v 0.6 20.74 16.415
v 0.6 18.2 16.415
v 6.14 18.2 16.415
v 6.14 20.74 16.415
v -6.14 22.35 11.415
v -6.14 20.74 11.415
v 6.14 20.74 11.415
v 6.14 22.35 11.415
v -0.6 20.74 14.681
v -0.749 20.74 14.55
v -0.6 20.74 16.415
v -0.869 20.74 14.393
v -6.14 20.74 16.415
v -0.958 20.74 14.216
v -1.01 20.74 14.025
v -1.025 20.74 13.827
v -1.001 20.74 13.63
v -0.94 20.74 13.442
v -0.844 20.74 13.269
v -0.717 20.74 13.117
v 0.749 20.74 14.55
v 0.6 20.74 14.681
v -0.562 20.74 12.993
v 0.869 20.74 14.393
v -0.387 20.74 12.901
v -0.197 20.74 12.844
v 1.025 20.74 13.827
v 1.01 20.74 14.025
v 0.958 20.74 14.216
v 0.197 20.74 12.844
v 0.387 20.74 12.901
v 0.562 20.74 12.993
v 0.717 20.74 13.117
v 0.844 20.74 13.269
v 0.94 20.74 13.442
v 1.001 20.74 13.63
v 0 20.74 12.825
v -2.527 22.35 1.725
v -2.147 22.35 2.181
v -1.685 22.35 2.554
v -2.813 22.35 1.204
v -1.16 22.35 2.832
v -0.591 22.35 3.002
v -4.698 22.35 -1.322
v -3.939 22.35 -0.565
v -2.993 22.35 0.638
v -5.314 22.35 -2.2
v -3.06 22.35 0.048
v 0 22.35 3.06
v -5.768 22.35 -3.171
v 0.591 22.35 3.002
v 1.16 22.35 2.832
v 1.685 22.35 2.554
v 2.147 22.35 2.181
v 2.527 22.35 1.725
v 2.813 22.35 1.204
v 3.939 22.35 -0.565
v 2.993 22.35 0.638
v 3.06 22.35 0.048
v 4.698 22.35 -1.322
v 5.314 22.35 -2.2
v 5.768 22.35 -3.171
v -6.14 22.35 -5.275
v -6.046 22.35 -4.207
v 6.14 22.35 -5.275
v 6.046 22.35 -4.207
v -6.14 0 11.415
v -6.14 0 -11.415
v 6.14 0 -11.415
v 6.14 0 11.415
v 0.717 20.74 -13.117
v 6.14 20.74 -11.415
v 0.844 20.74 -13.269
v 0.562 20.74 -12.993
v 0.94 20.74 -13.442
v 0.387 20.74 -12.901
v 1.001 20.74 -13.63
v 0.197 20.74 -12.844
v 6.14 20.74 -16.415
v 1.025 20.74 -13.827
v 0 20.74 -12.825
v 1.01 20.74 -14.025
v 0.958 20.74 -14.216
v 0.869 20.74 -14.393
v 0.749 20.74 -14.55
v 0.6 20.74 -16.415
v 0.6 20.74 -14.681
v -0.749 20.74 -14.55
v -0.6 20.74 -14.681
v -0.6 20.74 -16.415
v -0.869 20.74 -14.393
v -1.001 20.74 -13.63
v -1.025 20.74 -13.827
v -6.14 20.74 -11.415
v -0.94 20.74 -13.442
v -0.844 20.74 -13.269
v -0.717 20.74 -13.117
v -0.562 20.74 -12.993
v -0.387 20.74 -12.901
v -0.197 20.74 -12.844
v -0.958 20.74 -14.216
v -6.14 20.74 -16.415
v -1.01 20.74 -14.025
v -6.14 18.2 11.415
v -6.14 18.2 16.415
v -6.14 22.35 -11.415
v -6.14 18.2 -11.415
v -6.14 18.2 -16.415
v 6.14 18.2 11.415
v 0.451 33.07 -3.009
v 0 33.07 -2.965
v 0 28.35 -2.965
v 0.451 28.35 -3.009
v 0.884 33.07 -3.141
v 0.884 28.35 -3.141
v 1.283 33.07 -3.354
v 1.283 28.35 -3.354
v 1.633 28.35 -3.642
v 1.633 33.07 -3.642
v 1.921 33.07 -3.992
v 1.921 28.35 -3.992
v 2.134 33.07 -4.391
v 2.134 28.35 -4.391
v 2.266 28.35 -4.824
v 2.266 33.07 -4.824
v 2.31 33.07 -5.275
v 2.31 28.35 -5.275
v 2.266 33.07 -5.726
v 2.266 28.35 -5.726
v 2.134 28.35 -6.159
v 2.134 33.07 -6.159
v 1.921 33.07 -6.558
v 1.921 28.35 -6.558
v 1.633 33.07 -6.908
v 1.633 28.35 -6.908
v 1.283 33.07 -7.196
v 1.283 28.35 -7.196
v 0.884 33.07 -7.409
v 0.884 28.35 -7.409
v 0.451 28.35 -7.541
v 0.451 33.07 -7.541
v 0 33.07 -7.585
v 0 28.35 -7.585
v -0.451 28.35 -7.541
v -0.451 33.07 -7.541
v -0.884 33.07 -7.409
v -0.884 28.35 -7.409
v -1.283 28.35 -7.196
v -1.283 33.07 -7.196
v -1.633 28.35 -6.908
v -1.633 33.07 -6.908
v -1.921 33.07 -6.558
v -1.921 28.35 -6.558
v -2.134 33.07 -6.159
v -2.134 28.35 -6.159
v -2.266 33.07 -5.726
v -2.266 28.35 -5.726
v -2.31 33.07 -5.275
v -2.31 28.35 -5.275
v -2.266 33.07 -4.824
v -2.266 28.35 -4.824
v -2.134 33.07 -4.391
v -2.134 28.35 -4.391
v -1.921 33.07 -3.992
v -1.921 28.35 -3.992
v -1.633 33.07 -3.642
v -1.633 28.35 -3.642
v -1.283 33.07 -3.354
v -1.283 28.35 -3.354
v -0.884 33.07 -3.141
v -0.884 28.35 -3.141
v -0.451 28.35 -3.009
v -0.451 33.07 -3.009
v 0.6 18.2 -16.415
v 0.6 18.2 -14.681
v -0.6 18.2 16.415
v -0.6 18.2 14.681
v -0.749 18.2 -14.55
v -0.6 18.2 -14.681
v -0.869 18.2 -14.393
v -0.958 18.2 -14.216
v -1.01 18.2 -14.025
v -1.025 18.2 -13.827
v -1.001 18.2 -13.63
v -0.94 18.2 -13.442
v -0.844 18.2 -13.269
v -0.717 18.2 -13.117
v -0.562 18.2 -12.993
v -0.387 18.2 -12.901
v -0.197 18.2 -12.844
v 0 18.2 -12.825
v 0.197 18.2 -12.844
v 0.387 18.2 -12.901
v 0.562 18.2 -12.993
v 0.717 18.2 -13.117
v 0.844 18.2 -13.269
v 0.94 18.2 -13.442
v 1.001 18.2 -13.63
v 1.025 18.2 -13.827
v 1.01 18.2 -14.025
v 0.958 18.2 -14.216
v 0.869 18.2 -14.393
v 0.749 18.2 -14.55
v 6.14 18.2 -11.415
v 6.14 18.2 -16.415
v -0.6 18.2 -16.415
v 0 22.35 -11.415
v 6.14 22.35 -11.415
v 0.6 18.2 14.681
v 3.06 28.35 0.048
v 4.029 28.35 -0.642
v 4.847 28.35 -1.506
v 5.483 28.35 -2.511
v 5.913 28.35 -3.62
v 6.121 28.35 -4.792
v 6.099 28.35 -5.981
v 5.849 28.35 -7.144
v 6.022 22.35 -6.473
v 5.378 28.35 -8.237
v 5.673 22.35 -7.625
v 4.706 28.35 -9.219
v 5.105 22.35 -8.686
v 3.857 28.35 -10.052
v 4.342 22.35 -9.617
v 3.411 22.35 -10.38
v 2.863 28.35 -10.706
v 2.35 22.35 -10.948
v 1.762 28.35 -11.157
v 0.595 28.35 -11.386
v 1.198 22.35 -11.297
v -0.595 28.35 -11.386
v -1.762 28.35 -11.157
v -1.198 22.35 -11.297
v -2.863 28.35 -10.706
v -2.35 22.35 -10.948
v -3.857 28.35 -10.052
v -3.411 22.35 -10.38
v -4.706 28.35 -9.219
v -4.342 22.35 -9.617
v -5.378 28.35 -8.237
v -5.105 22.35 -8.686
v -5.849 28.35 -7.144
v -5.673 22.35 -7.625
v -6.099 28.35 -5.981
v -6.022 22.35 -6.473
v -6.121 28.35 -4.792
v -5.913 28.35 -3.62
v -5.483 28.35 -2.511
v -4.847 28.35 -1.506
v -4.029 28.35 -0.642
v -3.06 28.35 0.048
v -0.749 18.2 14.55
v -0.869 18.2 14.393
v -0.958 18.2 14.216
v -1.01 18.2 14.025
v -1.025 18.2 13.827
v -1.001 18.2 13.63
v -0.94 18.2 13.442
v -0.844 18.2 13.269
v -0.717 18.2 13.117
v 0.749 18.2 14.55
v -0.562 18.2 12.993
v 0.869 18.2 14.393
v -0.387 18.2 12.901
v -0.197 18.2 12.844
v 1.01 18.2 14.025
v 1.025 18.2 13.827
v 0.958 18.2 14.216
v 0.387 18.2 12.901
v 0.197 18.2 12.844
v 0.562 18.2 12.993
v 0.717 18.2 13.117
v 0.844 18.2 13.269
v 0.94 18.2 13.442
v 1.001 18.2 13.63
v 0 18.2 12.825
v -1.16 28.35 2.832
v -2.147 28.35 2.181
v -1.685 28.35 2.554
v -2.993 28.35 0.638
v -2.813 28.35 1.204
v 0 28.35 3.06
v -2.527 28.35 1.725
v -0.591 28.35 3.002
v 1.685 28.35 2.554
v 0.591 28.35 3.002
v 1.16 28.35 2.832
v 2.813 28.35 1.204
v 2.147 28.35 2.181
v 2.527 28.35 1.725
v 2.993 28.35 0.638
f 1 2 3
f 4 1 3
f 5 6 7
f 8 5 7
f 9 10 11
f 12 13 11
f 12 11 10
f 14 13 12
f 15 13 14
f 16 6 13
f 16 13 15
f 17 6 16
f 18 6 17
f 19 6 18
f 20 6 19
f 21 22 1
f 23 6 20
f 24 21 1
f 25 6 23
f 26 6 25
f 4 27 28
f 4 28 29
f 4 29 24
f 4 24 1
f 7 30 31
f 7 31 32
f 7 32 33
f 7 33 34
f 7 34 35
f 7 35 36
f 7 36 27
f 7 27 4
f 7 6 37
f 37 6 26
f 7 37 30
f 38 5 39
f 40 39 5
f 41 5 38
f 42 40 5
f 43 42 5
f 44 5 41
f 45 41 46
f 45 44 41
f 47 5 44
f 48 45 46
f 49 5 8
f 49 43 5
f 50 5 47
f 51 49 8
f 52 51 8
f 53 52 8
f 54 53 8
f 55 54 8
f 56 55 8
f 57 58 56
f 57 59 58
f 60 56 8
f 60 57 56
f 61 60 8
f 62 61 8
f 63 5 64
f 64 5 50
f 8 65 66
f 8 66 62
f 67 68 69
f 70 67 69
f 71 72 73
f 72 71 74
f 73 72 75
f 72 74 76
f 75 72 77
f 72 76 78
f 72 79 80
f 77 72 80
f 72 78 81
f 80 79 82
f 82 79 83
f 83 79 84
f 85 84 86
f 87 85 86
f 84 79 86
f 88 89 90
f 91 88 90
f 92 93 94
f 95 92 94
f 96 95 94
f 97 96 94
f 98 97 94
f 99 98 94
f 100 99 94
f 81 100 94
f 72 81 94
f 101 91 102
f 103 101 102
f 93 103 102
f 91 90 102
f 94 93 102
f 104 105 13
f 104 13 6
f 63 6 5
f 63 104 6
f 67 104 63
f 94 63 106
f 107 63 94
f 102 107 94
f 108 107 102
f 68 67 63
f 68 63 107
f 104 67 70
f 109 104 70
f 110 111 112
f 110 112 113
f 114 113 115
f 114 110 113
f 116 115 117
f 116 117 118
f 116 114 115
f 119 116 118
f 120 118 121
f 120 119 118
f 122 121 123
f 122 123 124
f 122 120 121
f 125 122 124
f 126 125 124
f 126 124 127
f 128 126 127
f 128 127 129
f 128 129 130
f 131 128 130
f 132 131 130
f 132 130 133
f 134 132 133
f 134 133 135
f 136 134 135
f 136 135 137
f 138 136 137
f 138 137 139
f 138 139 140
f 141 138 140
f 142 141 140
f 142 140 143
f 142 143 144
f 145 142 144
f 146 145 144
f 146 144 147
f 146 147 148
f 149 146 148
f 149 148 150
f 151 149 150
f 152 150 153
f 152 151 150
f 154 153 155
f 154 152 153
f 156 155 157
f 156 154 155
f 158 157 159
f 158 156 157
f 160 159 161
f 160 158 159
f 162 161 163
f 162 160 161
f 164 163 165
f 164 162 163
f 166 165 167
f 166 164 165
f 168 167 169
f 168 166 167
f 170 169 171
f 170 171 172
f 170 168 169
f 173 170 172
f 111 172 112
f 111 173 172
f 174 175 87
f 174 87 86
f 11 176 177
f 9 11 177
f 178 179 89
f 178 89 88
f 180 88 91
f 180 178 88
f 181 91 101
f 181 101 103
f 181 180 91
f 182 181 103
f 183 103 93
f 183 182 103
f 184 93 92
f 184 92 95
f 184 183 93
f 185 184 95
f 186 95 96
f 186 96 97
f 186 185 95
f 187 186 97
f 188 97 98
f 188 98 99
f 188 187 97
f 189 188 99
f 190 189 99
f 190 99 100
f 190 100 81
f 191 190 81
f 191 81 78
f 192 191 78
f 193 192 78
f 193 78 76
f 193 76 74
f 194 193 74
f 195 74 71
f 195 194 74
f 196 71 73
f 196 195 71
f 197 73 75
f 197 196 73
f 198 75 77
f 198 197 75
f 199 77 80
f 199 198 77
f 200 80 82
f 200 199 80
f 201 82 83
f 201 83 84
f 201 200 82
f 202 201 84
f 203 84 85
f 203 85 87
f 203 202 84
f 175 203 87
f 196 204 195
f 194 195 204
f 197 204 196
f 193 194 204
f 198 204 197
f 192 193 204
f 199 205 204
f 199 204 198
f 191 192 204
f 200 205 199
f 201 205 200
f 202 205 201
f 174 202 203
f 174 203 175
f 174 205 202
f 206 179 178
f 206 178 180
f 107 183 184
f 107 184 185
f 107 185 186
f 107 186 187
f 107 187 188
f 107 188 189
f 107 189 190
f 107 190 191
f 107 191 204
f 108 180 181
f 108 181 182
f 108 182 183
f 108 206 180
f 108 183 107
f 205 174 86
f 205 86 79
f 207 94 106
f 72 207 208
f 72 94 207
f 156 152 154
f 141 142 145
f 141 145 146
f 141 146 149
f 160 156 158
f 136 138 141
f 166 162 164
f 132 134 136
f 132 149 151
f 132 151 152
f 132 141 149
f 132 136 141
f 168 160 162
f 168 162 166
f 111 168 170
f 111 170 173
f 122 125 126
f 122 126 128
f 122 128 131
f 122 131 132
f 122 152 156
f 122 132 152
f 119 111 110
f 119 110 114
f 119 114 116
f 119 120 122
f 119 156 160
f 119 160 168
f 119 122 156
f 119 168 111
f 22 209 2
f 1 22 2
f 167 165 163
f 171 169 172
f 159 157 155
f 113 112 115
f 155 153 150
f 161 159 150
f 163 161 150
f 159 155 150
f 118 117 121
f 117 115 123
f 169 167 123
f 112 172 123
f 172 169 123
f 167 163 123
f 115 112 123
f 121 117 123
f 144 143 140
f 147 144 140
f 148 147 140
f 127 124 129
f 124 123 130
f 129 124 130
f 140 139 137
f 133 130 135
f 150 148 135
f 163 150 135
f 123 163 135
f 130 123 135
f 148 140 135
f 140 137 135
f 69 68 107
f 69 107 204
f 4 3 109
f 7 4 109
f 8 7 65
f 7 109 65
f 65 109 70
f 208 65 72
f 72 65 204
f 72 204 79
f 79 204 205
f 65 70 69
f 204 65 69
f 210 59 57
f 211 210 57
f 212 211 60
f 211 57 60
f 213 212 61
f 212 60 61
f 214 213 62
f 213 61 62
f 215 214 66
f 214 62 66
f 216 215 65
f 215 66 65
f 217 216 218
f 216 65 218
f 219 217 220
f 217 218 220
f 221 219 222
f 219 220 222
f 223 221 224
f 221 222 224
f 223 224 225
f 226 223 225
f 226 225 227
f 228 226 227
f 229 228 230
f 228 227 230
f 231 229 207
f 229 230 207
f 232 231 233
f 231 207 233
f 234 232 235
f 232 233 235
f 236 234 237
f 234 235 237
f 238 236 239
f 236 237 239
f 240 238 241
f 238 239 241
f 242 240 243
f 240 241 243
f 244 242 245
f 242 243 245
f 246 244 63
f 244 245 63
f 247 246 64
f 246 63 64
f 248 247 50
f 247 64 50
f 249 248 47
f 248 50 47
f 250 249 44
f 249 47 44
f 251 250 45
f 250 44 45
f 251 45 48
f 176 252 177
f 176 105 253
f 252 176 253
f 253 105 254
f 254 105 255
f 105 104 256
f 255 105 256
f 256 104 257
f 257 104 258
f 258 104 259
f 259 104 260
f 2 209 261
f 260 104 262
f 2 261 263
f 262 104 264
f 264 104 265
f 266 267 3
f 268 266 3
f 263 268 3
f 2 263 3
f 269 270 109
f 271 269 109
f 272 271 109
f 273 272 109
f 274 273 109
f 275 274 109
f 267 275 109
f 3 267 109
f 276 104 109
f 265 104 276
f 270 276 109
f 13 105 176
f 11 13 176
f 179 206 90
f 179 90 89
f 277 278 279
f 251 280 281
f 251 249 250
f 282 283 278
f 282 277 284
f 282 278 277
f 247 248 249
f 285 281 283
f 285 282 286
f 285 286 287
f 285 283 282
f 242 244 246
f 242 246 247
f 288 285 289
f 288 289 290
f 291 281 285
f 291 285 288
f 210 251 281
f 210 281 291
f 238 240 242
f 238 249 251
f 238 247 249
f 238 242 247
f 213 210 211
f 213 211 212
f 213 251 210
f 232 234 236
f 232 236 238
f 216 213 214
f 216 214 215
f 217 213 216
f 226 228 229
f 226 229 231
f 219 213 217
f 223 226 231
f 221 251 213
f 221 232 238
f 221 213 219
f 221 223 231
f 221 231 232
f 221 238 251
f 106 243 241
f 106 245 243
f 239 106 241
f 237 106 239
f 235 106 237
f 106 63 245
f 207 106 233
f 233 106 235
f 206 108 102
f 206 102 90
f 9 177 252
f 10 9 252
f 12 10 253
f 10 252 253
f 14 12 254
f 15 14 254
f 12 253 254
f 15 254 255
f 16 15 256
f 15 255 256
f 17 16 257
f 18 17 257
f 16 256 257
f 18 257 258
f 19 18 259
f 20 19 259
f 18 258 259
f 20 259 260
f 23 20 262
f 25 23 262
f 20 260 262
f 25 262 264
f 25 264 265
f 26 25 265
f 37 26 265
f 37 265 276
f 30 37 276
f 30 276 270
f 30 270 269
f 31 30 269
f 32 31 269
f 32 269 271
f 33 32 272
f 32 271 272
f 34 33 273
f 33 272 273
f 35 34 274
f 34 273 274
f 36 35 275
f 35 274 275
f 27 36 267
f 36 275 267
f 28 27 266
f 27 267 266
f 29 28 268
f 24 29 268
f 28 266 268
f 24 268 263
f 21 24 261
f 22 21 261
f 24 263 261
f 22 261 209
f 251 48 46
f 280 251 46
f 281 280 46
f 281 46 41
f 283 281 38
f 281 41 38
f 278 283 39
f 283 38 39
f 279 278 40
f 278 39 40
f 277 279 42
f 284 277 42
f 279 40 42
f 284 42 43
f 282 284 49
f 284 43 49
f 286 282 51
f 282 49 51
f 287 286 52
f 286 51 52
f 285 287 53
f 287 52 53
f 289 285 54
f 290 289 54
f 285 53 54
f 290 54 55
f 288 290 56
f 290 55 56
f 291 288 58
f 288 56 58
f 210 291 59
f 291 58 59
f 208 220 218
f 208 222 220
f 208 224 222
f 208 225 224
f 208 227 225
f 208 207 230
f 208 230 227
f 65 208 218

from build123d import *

# Parameters (mm, degrees)
SKETCH1_W           = 12.28
SKETCH1_H           = 22.83
BOSS_EXTRUDE1_DEPTH = 22.35
BOSS_EXTRUDE2_DEPTH = 2.54
BOSS_EXTRUDE3_DEPTH = 6
BOSS_EXTRUDE4_REACH = 39.427
SKETCH4_R           = 2.31


with BuildPart() as part:
    # Sketch1 → Boss-Extrude1 (new body)
    with BuildSketch(Plane(origin=(0, 0, 0), x_dir=(1, 0, 0), z_dir=(0, 1, 0))):
        Rectangle(SKETCH1_W, SKETCH1_H)
    extrude(amount=BOSS_EXTRUDE1_DEPTH)

    # Sketch2 → Boss-Extrude2 (add)
    with BuildSketch(Plane(origin=(0, 18.2, 0), x_dir=(-1, 0, 0), z_dir=(0, -1, 0))):
        with BuildLine():
            Line((6.14, 11.415), (6.14, 16.415))
            Line((6.14, 16.415), (0.6, 16.415))
            Line((0.6, 16.415), (0.6, 14.681038507))
            ThreePointArc((0.6, 14.681038507), (0, 12.825), (-0.6, 14.681038507))
            Line((-0.6, 14.681038507), (-0.6, 16.415))
            Line((-0.6, 16.415), (-6.14, 16.415))
            Line((-6.14, 16.415), (-6.14, 11.415))
            Line((-6.14, 11.415), (6.14, 11.415))
        make_face()
        with BuildLine():
            Line((6.14, -11.415), (6.14, -16.415))
            Line((6.14, -16.415), (0.6, -16.415))
            Line((0.6, -16.415), (0.6, -14.681038507))
            ThreePointArc((0.6, -14.681038507), (0, -12.825), (-0.6, -14.681038507))
            Line((-0.6, -14.681038507), (-0.6, -16.415))
            Line((-0.6, -16.415), (-6.14, -16.415))
            Line((-6.14, -16.415), (-6.14, -11.415))
            Line((-6.14, -11.415), (6.14, -11.415))
        make_face()
    extrude(amount=-BOSS_EXTRUDE2_DEPTH)

    # Sketch3 → Boss-Extrude3 (add)
    with BuildSketch(Plane(origin=(0, 22.35, 0), x_dir=(1, 0, 0), z_dir=(0, 1, 0))):
        with BuildLine():
            ThreePointArc((-3.059617572, -0.048376777), (0, -3.06), (3.059617572, -0.048376777))
            ThreePointArc((3.059617572, -0.048376777), (0, 11.415), (-3.059617572, -0.048376777))
        make_face()
    extrude(amount=BOSS_EXTRUDE3_DEPTH)


with BuildPart() as body_2:

    # Sketch4 → Boss-Extrude4 (new, up to next)
    with BuildSketch(Plane(origin=(0, 33.07, 0), x_dir=(1, 0, 0), z_dir=(0, 1, 0)), mode=Mode.PRIVATE) as boss_extrude4_sk1:
        with Locations(Location((0, 5.275, 0), (0, 0, 270))):
            Circle(SKETCH4_R)
    boss_extrude4_tool1 = extrude(boss_extrude4_sk1.sketch, amount=-BOSS_EXTRUDE4_REACH, mode=Mode.PRIVATE) - part.part
    add(boss_extrude4_tool1.solids().sort_by_distance((0, 33.07, -5.275))[0])


solid = Compound([part.part, body_2.part])
